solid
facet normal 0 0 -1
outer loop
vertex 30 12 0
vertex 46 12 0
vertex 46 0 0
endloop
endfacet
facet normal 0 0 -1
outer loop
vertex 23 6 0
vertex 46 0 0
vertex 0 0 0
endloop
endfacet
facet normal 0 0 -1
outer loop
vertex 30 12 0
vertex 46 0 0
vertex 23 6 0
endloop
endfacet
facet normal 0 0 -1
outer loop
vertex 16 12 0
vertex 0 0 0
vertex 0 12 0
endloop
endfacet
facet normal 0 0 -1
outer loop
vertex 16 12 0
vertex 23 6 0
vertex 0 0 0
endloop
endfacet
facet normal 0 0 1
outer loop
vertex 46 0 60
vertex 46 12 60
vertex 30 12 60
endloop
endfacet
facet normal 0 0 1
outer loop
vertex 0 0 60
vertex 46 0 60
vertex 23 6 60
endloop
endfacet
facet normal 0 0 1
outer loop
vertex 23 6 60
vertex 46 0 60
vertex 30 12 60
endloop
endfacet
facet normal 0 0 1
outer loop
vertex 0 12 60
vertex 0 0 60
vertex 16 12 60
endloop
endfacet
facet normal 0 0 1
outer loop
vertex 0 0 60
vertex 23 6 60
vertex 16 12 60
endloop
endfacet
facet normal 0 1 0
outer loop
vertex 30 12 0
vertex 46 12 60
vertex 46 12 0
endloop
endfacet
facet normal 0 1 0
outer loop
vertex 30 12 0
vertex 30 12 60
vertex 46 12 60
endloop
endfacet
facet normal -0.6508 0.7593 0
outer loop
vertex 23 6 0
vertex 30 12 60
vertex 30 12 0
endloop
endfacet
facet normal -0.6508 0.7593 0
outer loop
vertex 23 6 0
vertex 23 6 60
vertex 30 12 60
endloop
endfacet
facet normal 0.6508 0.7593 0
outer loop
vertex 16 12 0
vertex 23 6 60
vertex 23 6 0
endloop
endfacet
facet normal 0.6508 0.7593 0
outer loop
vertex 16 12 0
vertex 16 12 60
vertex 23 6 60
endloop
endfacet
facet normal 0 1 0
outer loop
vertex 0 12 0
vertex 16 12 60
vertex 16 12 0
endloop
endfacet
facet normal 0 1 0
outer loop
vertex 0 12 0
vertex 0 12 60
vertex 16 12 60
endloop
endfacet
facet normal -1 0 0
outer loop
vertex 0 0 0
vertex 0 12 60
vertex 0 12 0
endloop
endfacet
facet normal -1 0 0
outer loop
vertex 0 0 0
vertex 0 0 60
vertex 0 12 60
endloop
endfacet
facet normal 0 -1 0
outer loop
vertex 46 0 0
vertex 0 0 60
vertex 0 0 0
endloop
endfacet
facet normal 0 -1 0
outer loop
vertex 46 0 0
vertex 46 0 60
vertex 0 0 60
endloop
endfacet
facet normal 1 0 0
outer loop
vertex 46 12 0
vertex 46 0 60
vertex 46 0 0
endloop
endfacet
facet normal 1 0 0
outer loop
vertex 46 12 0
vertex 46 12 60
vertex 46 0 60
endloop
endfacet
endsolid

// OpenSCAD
$fn = 32;

// ----------------------------------------------------------------------
// V guide rail: vway, 46 mm wide
// ----------------------------------------------------------------------

// --- parameters (mm) ---
rail_w = 46;              // rail width, X
base_t = 12;              // base plate thickness
v_depth = 6;              // V feature depth / height
v_half_w = 7;             // half width of the V at the base face
plate_t = 60;             // rail length, Z (the extrusion height)

profile = [[0, 0], [46, 0], [46, 12], [30, 12], [23, 6], [16, 12], [0, 12]];  // primary outline, 7 points, counter clockwise

// --- the one profile operation ---
linear_extrude(height = plate_t) polygon(points = profile);
